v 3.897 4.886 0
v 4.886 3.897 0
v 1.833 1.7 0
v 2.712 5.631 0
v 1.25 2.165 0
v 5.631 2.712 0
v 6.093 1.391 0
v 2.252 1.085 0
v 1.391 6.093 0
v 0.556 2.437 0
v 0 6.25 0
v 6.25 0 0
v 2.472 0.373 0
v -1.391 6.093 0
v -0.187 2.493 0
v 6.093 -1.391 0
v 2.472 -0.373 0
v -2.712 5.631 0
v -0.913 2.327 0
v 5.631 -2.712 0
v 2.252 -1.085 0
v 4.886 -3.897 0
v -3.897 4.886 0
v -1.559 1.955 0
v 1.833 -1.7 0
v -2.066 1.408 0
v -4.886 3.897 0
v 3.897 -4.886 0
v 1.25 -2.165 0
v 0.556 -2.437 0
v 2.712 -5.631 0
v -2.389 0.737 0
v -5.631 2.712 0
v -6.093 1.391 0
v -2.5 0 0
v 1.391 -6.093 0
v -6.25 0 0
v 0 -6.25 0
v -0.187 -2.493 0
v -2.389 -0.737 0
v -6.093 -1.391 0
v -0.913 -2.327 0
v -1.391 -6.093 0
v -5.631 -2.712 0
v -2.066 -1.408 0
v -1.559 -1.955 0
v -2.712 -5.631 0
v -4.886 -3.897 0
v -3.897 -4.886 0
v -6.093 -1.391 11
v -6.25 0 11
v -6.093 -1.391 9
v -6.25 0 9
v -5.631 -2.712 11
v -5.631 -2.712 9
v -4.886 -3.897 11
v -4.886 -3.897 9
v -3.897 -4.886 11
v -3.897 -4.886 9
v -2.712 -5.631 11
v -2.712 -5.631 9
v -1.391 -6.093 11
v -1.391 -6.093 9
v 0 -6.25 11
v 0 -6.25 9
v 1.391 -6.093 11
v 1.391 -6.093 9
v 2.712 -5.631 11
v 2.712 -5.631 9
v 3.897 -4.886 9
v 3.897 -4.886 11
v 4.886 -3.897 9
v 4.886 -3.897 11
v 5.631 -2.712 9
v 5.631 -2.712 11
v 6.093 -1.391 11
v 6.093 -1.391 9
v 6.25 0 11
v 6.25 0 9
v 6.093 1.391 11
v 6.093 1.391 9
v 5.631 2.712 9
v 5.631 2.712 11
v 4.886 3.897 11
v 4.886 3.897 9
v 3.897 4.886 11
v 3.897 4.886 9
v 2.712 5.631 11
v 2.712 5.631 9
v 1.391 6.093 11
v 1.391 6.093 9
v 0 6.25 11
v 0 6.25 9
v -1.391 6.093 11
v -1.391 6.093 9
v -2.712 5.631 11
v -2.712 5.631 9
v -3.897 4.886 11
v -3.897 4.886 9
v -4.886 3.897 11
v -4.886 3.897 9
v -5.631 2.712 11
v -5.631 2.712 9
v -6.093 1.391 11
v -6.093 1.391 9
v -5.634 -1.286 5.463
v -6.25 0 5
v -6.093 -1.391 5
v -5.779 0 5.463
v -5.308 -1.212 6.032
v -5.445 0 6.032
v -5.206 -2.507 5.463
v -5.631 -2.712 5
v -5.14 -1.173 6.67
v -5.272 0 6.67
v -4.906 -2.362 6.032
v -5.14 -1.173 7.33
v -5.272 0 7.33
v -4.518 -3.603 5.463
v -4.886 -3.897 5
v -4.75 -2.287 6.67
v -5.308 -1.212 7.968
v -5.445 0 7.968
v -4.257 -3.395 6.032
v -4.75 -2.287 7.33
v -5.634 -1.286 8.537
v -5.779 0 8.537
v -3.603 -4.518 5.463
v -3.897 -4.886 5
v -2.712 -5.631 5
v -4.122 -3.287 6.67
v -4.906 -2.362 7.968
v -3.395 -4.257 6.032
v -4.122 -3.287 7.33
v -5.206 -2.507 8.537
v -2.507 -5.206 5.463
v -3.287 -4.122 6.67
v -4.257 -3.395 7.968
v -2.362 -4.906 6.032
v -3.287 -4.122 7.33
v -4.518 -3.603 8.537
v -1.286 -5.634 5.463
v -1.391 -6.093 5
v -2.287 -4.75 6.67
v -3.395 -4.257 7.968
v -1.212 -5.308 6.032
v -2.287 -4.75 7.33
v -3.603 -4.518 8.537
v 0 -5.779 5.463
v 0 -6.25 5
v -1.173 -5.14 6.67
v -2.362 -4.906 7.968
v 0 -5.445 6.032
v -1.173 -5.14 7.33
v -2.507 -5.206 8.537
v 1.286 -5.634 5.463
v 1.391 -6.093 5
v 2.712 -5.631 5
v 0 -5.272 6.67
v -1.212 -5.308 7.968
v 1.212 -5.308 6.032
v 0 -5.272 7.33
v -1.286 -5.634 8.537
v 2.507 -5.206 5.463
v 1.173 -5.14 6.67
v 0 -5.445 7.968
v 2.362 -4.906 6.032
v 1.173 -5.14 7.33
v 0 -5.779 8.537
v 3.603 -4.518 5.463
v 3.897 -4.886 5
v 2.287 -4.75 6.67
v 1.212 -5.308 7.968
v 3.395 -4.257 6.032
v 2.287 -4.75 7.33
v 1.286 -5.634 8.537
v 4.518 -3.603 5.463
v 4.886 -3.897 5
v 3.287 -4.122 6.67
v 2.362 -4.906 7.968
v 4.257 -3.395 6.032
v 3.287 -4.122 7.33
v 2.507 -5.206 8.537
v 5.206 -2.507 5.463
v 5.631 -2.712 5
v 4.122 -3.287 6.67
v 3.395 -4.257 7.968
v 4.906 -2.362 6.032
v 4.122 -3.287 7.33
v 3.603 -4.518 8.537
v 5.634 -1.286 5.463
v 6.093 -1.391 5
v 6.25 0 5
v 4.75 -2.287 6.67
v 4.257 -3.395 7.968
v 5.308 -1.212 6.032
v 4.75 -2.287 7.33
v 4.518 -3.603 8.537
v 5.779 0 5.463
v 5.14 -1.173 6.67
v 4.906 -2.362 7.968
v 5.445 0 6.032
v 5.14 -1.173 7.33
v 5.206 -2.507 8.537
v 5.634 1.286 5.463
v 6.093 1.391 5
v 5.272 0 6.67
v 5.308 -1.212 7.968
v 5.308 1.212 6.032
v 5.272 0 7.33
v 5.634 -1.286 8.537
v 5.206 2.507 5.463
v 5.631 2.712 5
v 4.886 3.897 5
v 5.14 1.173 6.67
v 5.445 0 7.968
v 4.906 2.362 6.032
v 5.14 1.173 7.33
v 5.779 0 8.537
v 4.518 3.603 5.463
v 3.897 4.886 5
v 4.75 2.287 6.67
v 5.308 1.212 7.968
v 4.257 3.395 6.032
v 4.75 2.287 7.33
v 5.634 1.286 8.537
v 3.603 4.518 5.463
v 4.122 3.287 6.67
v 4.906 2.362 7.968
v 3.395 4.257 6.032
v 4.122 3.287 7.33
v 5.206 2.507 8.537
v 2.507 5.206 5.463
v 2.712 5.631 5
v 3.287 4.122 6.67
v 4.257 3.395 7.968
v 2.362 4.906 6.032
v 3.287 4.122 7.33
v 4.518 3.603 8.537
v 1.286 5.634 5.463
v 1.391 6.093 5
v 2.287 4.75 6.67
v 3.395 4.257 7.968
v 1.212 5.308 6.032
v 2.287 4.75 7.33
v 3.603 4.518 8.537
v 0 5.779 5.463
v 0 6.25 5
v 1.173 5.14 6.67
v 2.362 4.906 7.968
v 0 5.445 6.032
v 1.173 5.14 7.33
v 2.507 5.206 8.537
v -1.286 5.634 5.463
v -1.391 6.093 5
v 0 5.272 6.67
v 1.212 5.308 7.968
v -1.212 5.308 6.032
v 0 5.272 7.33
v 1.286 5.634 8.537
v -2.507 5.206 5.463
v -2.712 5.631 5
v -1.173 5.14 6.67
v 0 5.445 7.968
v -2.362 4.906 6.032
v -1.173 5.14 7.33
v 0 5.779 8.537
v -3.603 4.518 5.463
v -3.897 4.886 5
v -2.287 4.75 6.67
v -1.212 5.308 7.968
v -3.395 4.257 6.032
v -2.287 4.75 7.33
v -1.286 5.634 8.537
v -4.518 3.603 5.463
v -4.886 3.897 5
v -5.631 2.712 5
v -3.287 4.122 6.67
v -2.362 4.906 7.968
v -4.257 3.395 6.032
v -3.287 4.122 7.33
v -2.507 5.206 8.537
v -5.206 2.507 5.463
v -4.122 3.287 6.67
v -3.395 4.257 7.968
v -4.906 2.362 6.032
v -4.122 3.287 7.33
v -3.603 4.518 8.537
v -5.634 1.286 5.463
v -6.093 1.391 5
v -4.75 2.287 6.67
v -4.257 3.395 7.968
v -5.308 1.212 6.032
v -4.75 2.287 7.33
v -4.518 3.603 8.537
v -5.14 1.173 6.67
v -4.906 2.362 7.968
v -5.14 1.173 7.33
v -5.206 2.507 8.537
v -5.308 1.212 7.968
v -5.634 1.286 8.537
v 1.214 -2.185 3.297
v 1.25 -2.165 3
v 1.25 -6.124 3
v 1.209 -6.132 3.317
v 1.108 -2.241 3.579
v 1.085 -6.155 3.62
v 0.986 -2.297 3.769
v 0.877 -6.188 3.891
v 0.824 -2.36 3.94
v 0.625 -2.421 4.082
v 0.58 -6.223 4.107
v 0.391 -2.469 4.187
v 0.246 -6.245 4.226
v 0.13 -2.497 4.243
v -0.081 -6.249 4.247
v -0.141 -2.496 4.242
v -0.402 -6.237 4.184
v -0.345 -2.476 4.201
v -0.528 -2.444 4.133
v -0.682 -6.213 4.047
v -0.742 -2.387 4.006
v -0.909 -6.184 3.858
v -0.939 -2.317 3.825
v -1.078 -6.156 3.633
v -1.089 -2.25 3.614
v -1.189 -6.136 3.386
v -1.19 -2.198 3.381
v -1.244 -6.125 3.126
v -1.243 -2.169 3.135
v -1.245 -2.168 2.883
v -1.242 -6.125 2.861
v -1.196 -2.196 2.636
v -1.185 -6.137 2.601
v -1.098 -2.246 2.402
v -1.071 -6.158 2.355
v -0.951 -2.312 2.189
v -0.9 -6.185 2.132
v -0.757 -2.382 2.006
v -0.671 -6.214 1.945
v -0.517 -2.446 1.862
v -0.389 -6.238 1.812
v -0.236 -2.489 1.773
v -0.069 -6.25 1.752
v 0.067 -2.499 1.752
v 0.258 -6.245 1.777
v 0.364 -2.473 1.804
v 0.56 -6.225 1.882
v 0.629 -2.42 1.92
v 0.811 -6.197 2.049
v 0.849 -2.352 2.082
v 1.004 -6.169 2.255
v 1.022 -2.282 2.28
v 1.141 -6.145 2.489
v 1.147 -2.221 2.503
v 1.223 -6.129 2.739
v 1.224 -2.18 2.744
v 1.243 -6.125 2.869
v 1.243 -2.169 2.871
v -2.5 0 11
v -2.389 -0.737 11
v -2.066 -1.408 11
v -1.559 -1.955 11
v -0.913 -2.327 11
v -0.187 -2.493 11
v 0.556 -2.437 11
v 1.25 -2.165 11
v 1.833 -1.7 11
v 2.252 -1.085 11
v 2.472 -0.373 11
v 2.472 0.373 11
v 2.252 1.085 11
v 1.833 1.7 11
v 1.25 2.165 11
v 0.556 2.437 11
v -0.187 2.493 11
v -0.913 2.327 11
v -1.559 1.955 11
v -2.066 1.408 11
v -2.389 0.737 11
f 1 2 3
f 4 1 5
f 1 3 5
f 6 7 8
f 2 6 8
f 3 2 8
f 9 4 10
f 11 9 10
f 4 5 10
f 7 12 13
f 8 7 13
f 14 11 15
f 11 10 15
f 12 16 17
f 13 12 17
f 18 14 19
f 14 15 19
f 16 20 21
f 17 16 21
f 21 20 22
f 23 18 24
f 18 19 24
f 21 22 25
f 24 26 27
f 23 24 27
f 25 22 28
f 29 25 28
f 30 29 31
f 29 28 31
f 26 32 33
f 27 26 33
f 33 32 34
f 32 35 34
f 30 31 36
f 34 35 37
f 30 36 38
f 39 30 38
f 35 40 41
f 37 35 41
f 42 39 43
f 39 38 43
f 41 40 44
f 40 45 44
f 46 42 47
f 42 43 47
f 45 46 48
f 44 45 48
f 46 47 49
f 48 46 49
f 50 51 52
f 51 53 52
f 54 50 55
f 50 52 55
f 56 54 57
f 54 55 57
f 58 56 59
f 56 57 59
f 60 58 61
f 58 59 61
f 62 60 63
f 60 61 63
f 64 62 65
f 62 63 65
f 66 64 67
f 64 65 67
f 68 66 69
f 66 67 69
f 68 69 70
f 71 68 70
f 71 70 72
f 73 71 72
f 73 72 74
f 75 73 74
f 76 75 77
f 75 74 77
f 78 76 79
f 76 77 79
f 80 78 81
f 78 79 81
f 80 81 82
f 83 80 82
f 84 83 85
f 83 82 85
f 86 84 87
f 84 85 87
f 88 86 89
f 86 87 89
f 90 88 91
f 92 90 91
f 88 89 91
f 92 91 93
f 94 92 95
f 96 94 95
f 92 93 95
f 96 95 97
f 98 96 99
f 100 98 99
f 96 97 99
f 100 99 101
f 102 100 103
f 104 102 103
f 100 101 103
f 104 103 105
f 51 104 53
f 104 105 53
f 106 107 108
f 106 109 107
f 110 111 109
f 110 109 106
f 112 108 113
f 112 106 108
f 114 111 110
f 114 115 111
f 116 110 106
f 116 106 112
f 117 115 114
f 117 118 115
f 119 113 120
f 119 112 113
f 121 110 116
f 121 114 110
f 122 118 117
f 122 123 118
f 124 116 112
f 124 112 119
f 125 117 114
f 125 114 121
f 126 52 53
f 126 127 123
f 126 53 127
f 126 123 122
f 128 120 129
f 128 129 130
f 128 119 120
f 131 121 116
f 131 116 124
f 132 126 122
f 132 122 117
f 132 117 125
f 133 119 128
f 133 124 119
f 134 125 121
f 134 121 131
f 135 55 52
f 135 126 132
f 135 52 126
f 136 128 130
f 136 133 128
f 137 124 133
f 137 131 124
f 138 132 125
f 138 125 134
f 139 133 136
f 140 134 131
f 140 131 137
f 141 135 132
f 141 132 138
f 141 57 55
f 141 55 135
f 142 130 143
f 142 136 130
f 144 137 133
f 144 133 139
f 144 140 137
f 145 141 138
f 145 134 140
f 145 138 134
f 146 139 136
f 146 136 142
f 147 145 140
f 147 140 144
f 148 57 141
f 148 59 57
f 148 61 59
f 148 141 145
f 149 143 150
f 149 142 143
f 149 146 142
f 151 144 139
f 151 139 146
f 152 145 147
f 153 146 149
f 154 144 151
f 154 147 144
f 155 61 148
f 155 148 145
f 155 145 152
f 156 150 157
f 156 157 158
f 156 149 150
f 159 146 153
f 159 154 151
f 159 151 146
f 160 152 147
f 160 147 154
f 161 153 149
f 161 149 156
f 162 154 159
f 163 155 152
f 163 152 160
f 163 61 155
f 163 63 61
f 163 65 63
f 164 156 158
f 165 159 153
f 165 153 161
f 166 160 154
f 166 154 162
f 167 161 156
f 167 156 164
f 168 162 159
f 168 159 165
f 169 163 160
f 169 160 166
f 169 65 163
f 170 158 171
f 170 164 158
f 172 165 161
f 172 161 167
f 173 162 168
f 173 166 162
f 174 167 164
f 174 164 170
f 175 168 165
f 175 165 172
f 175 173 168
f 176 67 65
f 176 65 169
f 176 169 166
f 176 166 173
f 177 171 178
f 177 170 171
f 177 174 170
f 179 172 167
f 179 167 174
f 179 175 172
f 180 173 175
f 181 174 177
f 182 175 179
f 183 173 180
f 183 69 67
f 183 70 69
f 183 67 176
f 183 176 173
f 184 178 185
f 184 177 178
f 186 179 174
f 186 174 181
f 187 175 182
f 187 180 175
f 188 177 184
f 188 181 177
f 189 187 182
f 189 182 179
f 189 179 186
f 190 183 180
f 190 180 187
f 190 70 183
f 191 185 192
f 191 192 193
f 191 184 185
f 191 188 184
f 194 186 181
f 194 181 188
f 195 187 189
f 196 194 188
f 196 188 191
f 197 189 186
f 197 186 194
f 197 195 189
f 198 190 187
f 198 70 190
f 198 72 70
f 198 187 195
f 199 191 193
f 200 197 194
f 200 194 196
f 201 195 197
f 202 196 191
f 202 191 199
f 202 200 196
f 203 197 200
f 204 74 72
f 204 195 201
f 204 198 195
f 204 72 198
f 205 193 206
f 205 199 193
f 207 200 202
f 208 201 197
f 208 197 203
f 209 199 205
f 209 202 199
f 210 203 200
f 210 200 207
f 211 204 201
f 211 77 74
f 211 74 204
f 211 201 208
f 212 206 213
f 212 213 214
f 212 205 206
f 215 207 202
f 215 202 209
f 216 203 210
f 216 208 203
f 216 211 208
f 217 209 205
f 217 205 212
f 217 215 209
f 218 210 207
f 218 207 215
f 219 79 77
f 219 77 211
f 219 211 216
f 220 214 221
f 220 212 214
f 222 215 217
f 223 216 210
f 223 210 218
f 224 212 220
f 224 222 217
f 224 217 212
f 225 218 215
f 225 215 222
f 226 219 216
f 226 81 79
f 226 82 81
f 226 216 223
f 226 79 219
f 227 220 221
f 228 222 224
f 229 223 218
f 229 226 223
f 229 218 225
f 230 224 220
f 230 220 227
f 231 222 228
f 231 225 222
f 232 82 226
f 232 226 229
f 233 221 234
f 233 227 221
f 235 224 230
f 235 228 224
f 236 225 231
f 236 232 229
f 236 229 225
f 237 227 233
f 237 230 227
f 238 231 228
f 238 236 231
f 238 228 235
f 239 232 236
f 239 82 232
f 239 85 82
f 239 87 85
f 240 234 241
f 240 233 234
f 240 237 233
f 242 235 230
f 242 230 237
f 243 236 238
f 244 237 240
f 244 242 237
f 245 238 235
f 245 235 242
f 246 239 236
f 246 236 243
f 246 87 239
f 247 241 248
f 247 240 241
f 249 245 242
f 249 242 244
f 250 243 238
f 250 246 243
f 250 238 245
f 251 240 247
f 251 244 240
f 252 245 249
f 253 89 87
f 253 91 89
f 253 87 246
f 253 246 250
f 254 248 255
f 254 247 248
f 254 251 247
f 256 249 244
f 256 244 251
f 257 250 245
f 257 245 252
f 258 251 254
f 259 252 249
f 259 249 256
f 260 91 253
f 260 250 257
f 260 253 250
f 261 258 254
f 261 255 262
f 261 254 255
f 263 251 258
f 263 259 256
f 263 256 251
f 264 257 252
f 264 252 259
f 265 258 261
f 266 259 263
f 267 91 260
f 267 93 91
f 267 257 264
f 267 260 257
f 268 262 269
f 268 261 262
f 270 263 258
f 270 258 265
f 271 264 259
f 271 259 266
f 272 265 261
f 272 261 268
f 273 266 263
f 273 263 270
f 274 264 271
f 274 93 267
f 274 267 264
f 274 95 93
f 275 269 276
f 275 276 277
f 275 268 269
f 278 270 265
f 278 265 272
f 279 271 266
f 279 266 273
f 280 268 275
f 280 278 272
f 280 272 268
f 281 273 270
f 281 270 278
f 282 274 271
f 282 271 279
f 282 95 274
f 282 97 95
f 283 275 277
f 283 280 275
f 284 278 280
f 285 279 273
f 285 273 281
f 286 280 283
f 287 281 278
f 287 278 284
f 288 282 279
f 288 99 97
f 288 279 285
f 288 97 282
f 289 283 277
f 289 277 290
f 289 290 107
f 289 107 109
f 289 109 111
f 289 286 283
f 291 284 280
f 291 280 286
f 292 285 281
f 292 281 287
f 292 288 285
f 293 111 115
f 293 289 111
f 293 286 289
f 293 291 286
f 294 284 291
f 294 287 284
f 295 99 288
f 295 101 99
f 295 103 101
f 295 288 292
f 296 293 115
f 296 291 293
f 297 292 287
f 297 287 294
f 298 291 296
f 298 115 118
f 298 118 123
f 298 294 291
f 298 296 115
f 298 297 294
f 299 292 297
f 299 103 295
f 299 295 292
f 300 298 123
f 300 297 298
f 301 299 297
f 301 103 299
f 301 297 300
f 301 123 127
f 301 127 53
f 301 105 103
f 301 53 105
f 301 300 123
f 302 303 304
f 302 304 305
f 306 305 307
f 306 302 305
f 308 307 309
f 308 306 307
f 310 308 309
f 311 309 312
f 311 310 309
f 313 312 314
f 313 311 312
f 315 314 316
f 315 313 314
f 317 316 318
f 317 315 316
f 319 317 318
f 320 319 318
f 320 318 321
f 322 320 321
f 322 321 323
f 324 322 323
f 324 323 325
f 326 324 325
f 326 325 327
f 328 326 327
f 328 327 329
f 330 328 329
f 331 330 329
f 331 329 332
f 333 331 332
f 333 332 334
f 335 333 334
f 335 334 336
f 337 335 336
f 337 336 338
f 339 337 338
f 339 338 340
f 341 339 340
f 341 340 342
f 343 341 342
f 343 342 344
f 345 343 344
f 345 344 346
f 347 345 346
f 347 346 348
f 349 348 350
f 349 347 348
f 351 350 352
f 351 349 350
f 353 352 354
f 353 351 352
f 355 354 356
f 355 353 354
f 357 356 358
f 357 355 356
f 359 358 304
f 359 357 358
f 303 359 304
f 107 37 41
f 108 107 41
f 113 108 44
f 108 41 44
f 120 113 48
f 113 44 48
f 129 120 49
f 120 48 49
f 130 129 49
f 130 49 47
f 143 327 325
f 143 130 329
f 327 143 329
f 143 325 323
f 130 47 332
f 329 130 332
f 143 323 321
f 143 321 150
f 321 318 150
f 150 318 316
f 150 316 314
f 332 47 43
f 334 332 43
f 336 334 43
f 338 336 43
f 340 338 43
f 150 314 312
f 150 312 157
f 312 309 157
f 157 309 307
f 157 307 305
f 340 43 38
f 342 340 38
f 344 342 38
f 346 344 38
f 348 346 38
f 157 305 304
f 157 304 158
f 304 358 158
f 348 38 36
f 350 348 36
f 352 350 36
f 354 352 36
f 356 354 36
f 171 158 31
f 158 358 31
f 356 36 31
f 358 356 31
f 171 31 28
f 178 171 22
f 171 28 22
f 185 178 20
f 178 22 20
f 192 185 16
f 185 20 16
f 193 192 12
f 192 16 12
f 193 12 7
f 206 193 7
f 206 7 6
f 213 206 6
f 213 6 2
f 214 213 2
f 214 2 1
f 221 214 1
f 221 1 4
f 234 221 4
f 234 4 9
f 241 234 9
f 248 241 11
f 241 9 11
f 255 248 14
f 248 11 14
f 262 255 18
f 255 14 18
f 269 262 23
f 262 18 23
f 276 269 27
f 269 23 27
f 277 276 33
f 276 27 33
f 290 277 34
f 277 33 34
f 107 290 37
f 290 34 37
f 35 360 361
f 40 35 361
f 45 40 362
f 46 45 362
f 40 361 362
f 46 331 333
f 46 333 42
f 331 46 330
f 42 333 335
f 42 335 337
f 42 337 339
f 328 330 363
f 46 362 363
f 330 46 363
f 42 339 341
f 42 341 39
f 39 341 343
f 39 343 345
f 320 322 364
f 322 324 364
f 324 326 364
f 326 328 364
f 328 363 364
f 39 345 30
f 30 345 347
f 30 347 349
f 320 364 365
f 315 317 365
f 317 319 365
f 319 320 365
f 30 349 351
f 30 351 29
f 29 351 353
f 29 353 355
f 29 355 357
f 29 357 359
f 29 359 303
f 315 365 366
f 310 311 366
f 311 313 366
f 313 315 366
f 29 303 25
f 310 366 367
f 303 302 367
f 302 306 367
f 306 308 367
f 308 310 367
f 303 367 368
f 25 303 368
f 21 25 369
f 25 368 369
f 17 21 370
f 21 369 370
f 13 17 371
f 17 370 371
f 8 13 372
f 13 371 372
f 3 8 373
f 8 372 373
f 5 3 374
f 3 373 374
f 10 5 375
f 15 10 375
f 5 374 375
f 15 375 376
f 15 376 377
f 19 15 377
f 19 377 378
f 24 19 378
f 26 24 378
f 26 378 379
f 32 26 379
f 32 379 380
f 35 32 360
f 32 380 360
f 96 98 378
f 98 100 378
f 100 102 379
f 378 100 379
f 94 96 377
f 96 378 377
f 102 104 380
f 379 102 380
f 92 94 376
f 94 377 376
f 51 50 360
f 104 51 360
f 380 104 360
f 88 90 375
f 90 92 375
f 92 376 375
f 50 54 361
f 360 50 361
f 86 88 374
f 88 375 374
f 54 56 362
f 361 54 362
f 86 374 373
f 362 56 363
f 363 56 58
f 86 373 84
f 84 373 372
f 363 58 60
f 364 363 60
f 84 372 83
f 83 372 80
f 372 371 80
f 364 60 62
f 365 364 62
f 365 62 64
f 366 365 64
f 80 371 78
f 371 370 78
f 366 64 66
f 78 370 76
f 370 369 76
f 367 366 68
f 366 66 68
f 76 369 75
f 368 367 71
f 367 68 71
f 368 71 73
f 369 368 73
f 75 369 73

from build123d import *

# Parameters (mm, degrees)
CYLINDER_R                     = 1.25
CYLINDER_DEPTH                 = 10
CYLINDER_ROLL_ANGLE            = 90
REVOLVE_ONTO_SKETCH_ROLL_ANGLE = 90


with BuildPart() as setscrew_drill:
    # Cylinder → Cylinder (new body)
    with BuildSketch(Plane.XY):
        Circle(CYLINDER_R)
    extrude(amount=CYLINDER_DEPTH)


with BuildPart() as setscrew_drill_1:
    # Cylinder roll: moved
    add(setscrew_drill.part.rotate(Axis((0, 0, 0), (1, 0, 0)), CYLINDER_ROLL_ANGLE))


with BuildPart() as setscrew_drill_2:
    # Cylinder placement: moved
    add(setscrew_drill_1.part.moved(Location((0, 0, 3))))


with BuildPart() as extruder_drive_gear:
    # Sketch as drawn → Revolve (revolve)
    with BuildSketch(Plane.XY):
        with BuildLine():
            Line((-6.25, 5), (-6.25, 0))
            Line((-6.25, 0), (-2.5, 0))
            Line((-2.5, 0), (-2.5, 11))
            Line((-2.5, 11), (-6.25, 11))
            Line((-6.25, 11), (-6.25, 9))
            ThreePointArc((-6.25, 5), (-5.25, 7), (-6.25, 9))
        make_face()
    revolve(axis=Axis((0, 0, 0), (0, 1, 0)))


with BuildPart() as extruder_drive_gear_1:
    # Revolve onto Sketch roll: moved
    add(extruder_drive_gear.part.rotate(Axis((0, 0, 0), (1, 0, 0)), REVOLVE_ONTO_SKETCH_ROLL_ANGLE))


with BuildPart() as extruder_drive_gear_2:
    # Revolve onto Sketch placement: moved
    add(extruder_drive_gear_1.part)

    # Cut: cut setscrew-drill
    add(setscrew_drill_2.part, mode=Mode.SUBTRACT)


solid = extruder_drive_gear_2.part
